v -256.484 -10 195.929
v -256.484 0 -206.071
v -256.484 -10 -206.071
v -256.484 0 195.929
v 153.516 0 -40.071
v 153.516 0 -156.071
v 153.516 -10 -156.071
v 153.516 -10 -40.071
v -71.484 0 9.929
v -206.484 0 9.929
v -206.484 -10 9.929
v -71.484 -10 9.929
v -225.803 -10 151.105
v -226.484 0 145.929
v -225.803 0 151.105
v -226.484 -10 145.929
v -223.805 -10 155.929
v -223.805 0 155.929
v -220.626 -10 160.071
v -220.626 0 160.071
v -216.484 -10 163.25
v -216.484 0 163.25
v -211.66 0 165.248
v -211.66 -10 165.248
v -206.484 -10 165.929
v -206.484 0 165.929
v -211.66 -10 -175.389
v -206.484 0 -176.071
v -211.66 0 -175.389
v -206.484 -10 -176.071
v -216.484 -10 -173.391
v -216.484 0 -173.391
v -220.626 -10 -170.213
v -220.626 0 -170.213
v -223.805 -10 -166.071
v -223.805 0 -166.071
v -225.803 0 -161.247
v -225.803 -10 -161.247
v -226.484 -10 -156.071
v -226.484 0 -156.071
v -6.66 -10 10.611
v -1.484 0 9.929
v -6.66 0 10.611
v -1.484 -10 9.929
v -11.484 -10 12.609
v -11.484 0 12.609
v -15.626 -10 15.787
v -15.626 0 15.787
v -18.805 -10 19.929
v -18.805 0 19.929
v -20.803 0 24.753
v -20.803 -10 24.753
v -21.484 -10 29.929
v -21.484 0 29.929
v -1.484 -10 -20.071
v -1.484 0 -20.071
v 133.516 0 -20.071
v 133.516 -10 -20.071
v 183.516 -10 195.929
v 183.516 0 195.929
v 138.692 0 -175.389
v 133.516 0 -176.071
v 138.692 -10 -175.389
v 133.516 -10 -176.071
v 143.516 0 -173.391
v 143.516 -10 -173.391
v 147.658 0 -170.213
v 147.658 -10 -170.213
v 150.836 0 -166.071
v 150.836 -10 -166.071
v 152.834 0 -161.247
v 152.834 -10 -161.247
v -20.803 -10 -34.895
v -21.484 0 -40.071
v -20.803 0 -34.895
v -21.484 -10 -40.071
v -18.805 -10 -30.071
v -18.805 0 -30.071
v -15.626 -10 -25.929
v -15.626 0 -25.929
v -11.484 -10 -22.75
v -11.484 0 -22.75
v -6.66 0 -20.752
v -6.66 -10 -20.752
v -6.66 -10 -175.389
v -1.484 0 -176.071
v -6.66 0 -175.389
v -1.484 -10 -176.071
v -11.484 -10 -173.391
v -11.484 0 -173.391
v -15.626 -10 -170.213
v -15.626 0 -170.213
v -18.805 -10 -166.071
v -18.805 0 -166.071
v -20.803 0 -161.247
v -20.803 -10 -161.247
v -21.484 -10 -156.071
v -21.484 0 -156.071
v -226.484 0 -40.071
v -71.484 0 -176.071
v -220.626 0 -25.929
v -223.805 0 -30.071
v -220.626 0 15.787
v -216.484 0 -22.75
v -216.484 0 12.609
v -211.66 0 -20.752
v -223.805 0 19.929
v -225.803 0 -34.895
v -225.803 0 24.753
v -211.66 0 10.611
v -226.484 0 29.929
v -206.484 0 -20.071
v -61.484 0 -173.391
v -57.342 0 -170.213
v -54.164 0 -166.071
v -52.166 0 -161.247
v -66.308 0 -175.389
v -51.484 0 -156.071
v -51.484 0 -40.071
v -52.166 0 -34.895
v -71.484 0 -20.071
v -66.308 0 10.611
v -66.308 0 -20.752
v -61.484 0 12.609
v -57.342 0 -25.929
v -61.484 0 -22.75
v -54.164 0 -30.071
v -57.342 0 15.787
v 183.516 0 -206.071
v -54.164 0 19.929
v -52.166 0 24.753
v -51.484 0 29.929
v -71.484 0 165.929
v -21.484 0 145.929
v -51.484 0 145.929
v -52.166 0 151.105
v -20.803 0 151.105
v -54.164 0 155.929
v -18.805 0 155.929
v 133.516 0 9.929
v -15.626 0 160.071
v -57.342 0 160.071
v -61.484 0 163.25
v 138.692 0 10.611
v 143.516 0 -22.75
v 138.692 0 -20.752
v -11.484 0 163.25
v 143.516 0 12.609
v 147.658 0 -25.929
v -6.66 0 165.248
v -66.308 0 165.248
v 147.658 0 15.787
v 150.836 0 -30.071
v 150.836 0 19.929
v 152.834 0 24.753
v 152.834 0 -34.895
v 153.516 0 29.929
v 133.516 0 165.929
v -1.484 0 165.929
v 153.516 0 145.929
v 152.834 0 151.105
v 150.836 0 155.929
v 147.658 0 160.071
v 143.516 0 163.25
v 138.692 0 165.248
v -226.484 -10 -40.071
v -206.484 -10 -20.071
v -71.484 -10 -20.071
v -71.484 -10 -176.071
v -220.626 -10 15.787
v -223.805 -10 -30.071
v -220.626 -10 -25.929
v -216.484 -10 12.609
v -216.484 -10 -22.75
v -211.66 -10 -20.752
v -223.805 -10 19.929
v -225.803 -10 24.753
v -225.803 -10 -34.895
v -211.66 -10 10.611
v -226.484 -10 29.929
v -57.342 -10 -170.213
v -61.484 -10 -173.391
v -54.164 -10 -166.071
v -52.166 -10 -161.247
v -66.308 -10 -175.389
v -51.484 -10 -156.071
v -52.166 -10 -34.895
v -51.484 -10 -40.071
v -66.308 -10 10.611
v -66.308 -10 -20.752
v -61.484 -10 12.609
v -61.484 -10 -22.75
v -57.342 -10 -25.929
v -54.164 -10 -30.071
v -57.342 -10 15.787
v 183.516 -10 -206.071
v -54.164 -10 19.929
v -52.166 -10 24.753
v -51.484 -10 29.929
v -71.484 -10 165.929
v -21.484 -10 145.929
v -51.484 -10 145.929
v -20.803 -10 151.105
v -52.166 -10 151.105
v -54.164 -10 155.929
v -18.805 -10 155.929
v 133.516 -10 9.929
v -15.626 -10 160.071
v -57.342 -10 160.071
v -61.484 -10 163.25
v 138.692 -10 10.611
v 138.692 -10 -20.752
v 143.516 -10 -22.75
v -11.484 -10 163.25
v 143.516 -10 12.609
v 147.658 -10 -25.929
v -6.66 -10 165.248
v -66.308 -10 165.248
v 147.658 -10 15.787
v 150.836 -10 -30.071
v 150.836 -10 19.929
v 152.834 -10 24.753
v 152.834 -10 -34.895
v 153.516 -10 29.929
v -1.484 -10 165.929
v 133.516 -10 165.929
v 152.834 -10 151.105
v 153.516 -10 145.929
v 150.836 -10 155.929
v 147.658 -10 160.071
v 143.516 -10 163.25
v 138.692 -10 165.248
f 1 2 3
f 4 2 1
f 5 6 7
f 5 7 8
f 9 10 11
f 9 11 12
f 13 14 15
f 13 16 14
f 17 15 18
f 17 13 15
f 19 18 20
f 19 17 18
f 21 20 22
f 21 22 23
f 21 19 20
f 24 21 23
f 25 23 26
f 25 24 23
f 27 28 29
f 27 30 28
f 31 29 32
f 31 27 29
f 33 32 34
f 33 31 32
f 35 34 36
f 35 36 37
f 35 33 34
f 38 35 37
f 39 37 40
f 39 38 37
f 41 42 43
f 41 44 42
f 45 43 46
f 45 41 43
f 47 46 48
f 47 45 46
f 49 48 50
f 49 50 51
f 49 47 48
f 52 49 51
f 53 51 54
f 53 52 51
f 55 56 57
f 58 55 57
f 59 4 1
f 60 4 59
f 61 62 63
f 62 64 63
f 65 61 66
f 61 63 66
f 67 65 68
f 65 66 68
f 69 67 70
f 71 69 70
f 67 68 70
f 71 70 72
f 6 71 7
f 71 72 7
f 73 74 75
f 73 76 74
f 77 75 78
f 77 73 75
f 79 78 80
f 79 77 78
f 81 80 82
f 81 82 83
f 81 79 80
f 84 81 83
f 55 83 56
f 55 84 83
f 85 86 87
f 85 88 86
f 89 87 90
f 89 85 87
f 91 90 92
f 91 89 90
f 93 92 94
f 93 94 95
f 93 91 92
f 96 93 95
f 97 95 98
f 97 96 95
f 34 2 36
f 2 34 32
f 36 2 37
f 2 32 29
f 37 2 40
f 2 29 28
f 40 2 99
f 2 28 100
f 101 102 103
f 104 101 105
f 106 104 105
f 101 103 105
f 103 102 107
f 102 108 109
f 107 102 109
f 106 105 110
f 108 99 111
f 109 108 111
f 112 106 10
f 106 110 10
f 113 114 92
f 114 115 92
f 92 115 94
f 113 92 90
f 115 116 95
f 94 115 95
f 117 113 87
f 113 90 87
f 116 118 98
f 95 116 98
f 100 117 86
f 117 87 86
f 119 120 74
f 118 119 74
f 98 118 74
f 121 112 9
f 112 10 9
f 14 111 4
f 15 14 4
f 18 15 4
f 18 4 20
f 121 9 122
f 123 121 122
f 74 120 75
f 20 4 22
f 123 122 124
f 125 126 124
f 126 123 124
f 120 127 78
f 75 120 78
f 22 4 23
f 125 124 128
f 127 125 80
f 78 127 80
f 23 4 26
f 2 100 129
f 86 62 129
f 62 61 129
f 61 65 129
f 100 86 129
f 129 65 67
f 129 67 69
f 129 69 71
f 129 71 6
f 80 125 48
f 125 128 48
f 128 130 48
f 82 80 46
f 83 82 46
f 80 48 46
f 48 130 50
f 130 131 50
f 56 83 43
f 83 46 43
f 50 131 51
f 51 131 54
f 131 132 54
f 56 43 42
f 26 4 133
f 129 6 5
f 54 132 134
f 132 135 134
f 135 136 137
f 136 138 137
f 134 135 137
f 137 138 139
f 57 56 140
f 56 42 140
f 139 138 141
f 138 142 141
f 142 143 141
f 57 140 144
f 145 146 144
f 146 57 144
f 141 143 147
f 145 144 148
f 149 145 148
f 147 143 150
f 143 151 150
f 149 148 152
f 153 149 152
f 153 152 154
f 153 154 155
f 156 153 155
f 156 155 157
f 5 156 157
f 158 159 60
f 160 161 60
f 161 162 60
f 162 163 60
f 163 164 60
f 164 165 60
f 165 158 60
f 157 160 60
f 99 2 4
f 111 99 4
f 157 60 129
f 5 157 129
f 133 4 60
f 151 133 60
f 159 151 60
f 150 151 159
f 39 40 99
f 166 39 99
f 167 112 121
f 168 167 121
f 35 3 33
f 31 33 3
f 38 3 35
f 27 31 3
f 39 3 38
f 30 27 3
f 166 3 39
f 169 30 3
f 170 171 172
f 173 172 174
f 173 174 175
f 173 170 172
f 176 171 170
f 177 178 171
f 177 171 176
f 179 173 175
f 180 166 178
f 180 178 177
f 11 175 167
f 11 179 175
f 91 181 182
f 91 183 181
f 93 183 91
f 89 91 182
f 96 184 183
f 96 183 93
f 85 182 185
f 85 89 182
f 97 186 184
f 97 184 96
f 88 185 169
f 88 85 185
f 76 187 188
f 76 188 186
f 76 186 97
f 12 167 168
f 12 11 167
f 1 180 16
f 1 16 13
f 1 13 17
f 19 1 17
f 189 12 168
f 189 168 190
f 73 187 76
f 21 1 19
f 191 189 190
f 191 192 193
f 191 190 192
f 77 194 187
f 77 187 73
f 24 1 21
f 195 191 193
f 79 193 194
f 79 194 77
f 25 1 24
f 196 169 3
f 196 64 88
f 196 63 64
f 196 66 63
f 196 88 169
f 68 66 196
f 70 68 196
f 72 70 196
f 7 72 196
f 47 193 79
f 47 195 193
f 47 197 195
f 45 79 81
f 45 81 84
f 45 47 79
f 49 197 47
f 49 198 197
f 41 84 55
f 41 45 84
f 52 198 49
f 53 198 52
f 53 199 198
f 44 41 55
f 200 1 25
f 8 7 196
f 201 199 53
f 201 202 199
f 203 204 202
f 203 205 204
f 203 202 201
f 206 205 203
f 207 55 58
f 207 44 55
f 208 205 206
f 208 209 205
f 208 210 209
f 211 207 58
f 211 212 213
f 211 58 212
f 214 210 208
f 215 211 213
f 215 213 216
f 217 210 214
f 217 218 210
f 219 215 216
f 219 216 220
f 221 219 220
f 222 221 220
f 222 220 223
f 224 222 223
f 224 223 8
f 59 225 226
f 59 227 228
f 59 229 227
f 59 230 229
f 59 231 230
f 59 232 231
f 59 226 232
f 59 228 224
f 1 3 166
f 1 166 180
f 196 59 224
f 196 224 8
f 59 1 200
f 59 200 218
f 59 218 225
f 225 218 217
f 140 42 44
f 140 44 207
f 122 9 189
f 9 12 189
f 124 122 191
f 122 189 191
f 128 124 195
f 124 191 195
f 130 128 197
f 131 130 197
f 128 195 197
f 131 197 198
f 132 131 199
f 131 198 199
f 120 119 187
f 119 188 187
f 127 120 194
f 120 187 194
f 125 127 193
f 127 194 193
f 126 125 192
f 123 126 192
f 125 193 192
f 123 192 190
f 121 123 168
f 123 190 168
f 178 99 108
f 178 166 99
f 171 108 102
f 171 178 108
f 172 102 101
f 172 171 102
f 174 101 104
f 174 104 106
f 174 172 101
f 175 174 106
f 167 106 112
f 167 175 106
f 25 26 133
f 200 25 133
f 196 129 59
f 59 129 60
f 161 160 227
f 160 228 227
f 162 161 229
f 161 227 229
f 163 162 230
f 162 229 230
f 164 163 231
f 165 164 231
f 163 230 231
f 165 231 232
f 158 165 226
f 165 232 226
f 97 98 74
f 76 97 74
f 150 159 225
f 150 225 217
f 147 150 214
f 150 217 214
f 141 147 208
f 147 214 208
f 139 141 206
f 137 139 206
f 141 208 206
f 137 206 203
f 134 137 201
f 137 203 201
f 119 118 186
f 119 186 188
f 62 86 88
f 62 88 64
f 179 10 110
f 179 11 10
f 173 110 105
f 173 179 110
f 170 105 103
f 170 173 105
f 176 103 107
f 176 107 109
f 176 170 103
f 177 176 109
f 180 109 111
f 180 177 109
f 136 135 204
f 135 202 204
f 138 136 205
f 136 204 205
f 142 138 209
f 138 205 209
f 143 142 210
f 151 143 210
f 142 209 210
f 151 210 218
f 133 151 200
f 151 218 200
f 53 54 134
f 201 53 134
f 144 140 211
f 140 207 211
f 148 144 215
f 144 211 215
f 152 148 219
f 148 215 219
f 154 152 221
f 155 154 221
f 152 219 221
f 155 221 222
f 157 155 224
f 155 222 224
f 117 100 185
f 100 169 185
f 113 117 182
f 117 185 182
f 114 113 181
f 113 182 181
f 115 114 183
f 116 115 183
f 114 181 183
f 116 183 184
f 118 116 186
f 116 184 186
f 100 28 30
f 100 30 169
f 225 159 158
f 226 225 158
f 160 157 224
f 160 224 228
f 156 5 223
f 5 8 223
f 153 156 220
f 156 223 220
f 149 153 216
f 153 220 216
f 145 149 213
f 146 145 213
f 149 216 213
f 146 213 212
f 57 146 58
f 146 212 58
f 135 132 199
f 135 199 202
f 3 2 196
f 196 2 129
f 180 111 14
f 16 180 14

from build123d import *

# Parameters (mm, degrees)
F0_W     = 440
F0_H     = 402
F0_W_2   = 175
F0_H_2   = 156
F1_DEPTH = 10
F2_R     = 20


with BuildPart() as f1:
    # F0 (on Front) → F1 (new body)
    with BuildSketch(Plane.XZ):
        with Locations((-36.484095, -5.070948)):
            Rectangle(F0_W, F0_H)
        with Locations((-138.984095, -98.070948)):
            Rectangle(F0_W_2, F0_H_2, mode=Mode.SUBTRACT)
        with Locations((66.015905, -98.070948)):
            Rectangle(F0_W_2, F0_H_2, mode=Mode.SUBTRACT)
        with Locations((-138.984095, 87.929052)):
            Rectangle(F0_W_2, F0_H_2, mode=Mode.SUBTRACT)
        with Locations((66.015905, 87.929052)):
            Rectangle(F0_W_2, F0_H_2, mode=Mode.SUBTRACT)
    extrude(amount=F1_DEPTH)

    # F2
    f2_edges = [f1.edges().sort_by_distance(p)[0] for p in [
        (153.515905, -5, 165.929052),
        (-21.484095, -5, 165.929052),
        (-226.484095, -5, 165.929052),
        (-226.484095, -5, -20.070948),
        (-21.484095, -5, -20.070948),
        (-51.484095, -5, 165.929052),
        (-51.484095, -5, 9.929052),
        (-51.484095, -5, -176.070948),
        (153.515905, -5, -176.070948),
        (153.515905, -5, 9.929052),
        (-226.484095, -5, -176.070948),
        (-226.484095, -5, 9.929052),
        (-21.484095, -5, -176.070948),
        (-21.484095, -5, 9.929052),
        (-51.484095, -5, -20.070948),
        (153.515905, -5, -20.070948),
    ]]
    fillet(f2_edges, radius=F2_R)


solid = f1.part
